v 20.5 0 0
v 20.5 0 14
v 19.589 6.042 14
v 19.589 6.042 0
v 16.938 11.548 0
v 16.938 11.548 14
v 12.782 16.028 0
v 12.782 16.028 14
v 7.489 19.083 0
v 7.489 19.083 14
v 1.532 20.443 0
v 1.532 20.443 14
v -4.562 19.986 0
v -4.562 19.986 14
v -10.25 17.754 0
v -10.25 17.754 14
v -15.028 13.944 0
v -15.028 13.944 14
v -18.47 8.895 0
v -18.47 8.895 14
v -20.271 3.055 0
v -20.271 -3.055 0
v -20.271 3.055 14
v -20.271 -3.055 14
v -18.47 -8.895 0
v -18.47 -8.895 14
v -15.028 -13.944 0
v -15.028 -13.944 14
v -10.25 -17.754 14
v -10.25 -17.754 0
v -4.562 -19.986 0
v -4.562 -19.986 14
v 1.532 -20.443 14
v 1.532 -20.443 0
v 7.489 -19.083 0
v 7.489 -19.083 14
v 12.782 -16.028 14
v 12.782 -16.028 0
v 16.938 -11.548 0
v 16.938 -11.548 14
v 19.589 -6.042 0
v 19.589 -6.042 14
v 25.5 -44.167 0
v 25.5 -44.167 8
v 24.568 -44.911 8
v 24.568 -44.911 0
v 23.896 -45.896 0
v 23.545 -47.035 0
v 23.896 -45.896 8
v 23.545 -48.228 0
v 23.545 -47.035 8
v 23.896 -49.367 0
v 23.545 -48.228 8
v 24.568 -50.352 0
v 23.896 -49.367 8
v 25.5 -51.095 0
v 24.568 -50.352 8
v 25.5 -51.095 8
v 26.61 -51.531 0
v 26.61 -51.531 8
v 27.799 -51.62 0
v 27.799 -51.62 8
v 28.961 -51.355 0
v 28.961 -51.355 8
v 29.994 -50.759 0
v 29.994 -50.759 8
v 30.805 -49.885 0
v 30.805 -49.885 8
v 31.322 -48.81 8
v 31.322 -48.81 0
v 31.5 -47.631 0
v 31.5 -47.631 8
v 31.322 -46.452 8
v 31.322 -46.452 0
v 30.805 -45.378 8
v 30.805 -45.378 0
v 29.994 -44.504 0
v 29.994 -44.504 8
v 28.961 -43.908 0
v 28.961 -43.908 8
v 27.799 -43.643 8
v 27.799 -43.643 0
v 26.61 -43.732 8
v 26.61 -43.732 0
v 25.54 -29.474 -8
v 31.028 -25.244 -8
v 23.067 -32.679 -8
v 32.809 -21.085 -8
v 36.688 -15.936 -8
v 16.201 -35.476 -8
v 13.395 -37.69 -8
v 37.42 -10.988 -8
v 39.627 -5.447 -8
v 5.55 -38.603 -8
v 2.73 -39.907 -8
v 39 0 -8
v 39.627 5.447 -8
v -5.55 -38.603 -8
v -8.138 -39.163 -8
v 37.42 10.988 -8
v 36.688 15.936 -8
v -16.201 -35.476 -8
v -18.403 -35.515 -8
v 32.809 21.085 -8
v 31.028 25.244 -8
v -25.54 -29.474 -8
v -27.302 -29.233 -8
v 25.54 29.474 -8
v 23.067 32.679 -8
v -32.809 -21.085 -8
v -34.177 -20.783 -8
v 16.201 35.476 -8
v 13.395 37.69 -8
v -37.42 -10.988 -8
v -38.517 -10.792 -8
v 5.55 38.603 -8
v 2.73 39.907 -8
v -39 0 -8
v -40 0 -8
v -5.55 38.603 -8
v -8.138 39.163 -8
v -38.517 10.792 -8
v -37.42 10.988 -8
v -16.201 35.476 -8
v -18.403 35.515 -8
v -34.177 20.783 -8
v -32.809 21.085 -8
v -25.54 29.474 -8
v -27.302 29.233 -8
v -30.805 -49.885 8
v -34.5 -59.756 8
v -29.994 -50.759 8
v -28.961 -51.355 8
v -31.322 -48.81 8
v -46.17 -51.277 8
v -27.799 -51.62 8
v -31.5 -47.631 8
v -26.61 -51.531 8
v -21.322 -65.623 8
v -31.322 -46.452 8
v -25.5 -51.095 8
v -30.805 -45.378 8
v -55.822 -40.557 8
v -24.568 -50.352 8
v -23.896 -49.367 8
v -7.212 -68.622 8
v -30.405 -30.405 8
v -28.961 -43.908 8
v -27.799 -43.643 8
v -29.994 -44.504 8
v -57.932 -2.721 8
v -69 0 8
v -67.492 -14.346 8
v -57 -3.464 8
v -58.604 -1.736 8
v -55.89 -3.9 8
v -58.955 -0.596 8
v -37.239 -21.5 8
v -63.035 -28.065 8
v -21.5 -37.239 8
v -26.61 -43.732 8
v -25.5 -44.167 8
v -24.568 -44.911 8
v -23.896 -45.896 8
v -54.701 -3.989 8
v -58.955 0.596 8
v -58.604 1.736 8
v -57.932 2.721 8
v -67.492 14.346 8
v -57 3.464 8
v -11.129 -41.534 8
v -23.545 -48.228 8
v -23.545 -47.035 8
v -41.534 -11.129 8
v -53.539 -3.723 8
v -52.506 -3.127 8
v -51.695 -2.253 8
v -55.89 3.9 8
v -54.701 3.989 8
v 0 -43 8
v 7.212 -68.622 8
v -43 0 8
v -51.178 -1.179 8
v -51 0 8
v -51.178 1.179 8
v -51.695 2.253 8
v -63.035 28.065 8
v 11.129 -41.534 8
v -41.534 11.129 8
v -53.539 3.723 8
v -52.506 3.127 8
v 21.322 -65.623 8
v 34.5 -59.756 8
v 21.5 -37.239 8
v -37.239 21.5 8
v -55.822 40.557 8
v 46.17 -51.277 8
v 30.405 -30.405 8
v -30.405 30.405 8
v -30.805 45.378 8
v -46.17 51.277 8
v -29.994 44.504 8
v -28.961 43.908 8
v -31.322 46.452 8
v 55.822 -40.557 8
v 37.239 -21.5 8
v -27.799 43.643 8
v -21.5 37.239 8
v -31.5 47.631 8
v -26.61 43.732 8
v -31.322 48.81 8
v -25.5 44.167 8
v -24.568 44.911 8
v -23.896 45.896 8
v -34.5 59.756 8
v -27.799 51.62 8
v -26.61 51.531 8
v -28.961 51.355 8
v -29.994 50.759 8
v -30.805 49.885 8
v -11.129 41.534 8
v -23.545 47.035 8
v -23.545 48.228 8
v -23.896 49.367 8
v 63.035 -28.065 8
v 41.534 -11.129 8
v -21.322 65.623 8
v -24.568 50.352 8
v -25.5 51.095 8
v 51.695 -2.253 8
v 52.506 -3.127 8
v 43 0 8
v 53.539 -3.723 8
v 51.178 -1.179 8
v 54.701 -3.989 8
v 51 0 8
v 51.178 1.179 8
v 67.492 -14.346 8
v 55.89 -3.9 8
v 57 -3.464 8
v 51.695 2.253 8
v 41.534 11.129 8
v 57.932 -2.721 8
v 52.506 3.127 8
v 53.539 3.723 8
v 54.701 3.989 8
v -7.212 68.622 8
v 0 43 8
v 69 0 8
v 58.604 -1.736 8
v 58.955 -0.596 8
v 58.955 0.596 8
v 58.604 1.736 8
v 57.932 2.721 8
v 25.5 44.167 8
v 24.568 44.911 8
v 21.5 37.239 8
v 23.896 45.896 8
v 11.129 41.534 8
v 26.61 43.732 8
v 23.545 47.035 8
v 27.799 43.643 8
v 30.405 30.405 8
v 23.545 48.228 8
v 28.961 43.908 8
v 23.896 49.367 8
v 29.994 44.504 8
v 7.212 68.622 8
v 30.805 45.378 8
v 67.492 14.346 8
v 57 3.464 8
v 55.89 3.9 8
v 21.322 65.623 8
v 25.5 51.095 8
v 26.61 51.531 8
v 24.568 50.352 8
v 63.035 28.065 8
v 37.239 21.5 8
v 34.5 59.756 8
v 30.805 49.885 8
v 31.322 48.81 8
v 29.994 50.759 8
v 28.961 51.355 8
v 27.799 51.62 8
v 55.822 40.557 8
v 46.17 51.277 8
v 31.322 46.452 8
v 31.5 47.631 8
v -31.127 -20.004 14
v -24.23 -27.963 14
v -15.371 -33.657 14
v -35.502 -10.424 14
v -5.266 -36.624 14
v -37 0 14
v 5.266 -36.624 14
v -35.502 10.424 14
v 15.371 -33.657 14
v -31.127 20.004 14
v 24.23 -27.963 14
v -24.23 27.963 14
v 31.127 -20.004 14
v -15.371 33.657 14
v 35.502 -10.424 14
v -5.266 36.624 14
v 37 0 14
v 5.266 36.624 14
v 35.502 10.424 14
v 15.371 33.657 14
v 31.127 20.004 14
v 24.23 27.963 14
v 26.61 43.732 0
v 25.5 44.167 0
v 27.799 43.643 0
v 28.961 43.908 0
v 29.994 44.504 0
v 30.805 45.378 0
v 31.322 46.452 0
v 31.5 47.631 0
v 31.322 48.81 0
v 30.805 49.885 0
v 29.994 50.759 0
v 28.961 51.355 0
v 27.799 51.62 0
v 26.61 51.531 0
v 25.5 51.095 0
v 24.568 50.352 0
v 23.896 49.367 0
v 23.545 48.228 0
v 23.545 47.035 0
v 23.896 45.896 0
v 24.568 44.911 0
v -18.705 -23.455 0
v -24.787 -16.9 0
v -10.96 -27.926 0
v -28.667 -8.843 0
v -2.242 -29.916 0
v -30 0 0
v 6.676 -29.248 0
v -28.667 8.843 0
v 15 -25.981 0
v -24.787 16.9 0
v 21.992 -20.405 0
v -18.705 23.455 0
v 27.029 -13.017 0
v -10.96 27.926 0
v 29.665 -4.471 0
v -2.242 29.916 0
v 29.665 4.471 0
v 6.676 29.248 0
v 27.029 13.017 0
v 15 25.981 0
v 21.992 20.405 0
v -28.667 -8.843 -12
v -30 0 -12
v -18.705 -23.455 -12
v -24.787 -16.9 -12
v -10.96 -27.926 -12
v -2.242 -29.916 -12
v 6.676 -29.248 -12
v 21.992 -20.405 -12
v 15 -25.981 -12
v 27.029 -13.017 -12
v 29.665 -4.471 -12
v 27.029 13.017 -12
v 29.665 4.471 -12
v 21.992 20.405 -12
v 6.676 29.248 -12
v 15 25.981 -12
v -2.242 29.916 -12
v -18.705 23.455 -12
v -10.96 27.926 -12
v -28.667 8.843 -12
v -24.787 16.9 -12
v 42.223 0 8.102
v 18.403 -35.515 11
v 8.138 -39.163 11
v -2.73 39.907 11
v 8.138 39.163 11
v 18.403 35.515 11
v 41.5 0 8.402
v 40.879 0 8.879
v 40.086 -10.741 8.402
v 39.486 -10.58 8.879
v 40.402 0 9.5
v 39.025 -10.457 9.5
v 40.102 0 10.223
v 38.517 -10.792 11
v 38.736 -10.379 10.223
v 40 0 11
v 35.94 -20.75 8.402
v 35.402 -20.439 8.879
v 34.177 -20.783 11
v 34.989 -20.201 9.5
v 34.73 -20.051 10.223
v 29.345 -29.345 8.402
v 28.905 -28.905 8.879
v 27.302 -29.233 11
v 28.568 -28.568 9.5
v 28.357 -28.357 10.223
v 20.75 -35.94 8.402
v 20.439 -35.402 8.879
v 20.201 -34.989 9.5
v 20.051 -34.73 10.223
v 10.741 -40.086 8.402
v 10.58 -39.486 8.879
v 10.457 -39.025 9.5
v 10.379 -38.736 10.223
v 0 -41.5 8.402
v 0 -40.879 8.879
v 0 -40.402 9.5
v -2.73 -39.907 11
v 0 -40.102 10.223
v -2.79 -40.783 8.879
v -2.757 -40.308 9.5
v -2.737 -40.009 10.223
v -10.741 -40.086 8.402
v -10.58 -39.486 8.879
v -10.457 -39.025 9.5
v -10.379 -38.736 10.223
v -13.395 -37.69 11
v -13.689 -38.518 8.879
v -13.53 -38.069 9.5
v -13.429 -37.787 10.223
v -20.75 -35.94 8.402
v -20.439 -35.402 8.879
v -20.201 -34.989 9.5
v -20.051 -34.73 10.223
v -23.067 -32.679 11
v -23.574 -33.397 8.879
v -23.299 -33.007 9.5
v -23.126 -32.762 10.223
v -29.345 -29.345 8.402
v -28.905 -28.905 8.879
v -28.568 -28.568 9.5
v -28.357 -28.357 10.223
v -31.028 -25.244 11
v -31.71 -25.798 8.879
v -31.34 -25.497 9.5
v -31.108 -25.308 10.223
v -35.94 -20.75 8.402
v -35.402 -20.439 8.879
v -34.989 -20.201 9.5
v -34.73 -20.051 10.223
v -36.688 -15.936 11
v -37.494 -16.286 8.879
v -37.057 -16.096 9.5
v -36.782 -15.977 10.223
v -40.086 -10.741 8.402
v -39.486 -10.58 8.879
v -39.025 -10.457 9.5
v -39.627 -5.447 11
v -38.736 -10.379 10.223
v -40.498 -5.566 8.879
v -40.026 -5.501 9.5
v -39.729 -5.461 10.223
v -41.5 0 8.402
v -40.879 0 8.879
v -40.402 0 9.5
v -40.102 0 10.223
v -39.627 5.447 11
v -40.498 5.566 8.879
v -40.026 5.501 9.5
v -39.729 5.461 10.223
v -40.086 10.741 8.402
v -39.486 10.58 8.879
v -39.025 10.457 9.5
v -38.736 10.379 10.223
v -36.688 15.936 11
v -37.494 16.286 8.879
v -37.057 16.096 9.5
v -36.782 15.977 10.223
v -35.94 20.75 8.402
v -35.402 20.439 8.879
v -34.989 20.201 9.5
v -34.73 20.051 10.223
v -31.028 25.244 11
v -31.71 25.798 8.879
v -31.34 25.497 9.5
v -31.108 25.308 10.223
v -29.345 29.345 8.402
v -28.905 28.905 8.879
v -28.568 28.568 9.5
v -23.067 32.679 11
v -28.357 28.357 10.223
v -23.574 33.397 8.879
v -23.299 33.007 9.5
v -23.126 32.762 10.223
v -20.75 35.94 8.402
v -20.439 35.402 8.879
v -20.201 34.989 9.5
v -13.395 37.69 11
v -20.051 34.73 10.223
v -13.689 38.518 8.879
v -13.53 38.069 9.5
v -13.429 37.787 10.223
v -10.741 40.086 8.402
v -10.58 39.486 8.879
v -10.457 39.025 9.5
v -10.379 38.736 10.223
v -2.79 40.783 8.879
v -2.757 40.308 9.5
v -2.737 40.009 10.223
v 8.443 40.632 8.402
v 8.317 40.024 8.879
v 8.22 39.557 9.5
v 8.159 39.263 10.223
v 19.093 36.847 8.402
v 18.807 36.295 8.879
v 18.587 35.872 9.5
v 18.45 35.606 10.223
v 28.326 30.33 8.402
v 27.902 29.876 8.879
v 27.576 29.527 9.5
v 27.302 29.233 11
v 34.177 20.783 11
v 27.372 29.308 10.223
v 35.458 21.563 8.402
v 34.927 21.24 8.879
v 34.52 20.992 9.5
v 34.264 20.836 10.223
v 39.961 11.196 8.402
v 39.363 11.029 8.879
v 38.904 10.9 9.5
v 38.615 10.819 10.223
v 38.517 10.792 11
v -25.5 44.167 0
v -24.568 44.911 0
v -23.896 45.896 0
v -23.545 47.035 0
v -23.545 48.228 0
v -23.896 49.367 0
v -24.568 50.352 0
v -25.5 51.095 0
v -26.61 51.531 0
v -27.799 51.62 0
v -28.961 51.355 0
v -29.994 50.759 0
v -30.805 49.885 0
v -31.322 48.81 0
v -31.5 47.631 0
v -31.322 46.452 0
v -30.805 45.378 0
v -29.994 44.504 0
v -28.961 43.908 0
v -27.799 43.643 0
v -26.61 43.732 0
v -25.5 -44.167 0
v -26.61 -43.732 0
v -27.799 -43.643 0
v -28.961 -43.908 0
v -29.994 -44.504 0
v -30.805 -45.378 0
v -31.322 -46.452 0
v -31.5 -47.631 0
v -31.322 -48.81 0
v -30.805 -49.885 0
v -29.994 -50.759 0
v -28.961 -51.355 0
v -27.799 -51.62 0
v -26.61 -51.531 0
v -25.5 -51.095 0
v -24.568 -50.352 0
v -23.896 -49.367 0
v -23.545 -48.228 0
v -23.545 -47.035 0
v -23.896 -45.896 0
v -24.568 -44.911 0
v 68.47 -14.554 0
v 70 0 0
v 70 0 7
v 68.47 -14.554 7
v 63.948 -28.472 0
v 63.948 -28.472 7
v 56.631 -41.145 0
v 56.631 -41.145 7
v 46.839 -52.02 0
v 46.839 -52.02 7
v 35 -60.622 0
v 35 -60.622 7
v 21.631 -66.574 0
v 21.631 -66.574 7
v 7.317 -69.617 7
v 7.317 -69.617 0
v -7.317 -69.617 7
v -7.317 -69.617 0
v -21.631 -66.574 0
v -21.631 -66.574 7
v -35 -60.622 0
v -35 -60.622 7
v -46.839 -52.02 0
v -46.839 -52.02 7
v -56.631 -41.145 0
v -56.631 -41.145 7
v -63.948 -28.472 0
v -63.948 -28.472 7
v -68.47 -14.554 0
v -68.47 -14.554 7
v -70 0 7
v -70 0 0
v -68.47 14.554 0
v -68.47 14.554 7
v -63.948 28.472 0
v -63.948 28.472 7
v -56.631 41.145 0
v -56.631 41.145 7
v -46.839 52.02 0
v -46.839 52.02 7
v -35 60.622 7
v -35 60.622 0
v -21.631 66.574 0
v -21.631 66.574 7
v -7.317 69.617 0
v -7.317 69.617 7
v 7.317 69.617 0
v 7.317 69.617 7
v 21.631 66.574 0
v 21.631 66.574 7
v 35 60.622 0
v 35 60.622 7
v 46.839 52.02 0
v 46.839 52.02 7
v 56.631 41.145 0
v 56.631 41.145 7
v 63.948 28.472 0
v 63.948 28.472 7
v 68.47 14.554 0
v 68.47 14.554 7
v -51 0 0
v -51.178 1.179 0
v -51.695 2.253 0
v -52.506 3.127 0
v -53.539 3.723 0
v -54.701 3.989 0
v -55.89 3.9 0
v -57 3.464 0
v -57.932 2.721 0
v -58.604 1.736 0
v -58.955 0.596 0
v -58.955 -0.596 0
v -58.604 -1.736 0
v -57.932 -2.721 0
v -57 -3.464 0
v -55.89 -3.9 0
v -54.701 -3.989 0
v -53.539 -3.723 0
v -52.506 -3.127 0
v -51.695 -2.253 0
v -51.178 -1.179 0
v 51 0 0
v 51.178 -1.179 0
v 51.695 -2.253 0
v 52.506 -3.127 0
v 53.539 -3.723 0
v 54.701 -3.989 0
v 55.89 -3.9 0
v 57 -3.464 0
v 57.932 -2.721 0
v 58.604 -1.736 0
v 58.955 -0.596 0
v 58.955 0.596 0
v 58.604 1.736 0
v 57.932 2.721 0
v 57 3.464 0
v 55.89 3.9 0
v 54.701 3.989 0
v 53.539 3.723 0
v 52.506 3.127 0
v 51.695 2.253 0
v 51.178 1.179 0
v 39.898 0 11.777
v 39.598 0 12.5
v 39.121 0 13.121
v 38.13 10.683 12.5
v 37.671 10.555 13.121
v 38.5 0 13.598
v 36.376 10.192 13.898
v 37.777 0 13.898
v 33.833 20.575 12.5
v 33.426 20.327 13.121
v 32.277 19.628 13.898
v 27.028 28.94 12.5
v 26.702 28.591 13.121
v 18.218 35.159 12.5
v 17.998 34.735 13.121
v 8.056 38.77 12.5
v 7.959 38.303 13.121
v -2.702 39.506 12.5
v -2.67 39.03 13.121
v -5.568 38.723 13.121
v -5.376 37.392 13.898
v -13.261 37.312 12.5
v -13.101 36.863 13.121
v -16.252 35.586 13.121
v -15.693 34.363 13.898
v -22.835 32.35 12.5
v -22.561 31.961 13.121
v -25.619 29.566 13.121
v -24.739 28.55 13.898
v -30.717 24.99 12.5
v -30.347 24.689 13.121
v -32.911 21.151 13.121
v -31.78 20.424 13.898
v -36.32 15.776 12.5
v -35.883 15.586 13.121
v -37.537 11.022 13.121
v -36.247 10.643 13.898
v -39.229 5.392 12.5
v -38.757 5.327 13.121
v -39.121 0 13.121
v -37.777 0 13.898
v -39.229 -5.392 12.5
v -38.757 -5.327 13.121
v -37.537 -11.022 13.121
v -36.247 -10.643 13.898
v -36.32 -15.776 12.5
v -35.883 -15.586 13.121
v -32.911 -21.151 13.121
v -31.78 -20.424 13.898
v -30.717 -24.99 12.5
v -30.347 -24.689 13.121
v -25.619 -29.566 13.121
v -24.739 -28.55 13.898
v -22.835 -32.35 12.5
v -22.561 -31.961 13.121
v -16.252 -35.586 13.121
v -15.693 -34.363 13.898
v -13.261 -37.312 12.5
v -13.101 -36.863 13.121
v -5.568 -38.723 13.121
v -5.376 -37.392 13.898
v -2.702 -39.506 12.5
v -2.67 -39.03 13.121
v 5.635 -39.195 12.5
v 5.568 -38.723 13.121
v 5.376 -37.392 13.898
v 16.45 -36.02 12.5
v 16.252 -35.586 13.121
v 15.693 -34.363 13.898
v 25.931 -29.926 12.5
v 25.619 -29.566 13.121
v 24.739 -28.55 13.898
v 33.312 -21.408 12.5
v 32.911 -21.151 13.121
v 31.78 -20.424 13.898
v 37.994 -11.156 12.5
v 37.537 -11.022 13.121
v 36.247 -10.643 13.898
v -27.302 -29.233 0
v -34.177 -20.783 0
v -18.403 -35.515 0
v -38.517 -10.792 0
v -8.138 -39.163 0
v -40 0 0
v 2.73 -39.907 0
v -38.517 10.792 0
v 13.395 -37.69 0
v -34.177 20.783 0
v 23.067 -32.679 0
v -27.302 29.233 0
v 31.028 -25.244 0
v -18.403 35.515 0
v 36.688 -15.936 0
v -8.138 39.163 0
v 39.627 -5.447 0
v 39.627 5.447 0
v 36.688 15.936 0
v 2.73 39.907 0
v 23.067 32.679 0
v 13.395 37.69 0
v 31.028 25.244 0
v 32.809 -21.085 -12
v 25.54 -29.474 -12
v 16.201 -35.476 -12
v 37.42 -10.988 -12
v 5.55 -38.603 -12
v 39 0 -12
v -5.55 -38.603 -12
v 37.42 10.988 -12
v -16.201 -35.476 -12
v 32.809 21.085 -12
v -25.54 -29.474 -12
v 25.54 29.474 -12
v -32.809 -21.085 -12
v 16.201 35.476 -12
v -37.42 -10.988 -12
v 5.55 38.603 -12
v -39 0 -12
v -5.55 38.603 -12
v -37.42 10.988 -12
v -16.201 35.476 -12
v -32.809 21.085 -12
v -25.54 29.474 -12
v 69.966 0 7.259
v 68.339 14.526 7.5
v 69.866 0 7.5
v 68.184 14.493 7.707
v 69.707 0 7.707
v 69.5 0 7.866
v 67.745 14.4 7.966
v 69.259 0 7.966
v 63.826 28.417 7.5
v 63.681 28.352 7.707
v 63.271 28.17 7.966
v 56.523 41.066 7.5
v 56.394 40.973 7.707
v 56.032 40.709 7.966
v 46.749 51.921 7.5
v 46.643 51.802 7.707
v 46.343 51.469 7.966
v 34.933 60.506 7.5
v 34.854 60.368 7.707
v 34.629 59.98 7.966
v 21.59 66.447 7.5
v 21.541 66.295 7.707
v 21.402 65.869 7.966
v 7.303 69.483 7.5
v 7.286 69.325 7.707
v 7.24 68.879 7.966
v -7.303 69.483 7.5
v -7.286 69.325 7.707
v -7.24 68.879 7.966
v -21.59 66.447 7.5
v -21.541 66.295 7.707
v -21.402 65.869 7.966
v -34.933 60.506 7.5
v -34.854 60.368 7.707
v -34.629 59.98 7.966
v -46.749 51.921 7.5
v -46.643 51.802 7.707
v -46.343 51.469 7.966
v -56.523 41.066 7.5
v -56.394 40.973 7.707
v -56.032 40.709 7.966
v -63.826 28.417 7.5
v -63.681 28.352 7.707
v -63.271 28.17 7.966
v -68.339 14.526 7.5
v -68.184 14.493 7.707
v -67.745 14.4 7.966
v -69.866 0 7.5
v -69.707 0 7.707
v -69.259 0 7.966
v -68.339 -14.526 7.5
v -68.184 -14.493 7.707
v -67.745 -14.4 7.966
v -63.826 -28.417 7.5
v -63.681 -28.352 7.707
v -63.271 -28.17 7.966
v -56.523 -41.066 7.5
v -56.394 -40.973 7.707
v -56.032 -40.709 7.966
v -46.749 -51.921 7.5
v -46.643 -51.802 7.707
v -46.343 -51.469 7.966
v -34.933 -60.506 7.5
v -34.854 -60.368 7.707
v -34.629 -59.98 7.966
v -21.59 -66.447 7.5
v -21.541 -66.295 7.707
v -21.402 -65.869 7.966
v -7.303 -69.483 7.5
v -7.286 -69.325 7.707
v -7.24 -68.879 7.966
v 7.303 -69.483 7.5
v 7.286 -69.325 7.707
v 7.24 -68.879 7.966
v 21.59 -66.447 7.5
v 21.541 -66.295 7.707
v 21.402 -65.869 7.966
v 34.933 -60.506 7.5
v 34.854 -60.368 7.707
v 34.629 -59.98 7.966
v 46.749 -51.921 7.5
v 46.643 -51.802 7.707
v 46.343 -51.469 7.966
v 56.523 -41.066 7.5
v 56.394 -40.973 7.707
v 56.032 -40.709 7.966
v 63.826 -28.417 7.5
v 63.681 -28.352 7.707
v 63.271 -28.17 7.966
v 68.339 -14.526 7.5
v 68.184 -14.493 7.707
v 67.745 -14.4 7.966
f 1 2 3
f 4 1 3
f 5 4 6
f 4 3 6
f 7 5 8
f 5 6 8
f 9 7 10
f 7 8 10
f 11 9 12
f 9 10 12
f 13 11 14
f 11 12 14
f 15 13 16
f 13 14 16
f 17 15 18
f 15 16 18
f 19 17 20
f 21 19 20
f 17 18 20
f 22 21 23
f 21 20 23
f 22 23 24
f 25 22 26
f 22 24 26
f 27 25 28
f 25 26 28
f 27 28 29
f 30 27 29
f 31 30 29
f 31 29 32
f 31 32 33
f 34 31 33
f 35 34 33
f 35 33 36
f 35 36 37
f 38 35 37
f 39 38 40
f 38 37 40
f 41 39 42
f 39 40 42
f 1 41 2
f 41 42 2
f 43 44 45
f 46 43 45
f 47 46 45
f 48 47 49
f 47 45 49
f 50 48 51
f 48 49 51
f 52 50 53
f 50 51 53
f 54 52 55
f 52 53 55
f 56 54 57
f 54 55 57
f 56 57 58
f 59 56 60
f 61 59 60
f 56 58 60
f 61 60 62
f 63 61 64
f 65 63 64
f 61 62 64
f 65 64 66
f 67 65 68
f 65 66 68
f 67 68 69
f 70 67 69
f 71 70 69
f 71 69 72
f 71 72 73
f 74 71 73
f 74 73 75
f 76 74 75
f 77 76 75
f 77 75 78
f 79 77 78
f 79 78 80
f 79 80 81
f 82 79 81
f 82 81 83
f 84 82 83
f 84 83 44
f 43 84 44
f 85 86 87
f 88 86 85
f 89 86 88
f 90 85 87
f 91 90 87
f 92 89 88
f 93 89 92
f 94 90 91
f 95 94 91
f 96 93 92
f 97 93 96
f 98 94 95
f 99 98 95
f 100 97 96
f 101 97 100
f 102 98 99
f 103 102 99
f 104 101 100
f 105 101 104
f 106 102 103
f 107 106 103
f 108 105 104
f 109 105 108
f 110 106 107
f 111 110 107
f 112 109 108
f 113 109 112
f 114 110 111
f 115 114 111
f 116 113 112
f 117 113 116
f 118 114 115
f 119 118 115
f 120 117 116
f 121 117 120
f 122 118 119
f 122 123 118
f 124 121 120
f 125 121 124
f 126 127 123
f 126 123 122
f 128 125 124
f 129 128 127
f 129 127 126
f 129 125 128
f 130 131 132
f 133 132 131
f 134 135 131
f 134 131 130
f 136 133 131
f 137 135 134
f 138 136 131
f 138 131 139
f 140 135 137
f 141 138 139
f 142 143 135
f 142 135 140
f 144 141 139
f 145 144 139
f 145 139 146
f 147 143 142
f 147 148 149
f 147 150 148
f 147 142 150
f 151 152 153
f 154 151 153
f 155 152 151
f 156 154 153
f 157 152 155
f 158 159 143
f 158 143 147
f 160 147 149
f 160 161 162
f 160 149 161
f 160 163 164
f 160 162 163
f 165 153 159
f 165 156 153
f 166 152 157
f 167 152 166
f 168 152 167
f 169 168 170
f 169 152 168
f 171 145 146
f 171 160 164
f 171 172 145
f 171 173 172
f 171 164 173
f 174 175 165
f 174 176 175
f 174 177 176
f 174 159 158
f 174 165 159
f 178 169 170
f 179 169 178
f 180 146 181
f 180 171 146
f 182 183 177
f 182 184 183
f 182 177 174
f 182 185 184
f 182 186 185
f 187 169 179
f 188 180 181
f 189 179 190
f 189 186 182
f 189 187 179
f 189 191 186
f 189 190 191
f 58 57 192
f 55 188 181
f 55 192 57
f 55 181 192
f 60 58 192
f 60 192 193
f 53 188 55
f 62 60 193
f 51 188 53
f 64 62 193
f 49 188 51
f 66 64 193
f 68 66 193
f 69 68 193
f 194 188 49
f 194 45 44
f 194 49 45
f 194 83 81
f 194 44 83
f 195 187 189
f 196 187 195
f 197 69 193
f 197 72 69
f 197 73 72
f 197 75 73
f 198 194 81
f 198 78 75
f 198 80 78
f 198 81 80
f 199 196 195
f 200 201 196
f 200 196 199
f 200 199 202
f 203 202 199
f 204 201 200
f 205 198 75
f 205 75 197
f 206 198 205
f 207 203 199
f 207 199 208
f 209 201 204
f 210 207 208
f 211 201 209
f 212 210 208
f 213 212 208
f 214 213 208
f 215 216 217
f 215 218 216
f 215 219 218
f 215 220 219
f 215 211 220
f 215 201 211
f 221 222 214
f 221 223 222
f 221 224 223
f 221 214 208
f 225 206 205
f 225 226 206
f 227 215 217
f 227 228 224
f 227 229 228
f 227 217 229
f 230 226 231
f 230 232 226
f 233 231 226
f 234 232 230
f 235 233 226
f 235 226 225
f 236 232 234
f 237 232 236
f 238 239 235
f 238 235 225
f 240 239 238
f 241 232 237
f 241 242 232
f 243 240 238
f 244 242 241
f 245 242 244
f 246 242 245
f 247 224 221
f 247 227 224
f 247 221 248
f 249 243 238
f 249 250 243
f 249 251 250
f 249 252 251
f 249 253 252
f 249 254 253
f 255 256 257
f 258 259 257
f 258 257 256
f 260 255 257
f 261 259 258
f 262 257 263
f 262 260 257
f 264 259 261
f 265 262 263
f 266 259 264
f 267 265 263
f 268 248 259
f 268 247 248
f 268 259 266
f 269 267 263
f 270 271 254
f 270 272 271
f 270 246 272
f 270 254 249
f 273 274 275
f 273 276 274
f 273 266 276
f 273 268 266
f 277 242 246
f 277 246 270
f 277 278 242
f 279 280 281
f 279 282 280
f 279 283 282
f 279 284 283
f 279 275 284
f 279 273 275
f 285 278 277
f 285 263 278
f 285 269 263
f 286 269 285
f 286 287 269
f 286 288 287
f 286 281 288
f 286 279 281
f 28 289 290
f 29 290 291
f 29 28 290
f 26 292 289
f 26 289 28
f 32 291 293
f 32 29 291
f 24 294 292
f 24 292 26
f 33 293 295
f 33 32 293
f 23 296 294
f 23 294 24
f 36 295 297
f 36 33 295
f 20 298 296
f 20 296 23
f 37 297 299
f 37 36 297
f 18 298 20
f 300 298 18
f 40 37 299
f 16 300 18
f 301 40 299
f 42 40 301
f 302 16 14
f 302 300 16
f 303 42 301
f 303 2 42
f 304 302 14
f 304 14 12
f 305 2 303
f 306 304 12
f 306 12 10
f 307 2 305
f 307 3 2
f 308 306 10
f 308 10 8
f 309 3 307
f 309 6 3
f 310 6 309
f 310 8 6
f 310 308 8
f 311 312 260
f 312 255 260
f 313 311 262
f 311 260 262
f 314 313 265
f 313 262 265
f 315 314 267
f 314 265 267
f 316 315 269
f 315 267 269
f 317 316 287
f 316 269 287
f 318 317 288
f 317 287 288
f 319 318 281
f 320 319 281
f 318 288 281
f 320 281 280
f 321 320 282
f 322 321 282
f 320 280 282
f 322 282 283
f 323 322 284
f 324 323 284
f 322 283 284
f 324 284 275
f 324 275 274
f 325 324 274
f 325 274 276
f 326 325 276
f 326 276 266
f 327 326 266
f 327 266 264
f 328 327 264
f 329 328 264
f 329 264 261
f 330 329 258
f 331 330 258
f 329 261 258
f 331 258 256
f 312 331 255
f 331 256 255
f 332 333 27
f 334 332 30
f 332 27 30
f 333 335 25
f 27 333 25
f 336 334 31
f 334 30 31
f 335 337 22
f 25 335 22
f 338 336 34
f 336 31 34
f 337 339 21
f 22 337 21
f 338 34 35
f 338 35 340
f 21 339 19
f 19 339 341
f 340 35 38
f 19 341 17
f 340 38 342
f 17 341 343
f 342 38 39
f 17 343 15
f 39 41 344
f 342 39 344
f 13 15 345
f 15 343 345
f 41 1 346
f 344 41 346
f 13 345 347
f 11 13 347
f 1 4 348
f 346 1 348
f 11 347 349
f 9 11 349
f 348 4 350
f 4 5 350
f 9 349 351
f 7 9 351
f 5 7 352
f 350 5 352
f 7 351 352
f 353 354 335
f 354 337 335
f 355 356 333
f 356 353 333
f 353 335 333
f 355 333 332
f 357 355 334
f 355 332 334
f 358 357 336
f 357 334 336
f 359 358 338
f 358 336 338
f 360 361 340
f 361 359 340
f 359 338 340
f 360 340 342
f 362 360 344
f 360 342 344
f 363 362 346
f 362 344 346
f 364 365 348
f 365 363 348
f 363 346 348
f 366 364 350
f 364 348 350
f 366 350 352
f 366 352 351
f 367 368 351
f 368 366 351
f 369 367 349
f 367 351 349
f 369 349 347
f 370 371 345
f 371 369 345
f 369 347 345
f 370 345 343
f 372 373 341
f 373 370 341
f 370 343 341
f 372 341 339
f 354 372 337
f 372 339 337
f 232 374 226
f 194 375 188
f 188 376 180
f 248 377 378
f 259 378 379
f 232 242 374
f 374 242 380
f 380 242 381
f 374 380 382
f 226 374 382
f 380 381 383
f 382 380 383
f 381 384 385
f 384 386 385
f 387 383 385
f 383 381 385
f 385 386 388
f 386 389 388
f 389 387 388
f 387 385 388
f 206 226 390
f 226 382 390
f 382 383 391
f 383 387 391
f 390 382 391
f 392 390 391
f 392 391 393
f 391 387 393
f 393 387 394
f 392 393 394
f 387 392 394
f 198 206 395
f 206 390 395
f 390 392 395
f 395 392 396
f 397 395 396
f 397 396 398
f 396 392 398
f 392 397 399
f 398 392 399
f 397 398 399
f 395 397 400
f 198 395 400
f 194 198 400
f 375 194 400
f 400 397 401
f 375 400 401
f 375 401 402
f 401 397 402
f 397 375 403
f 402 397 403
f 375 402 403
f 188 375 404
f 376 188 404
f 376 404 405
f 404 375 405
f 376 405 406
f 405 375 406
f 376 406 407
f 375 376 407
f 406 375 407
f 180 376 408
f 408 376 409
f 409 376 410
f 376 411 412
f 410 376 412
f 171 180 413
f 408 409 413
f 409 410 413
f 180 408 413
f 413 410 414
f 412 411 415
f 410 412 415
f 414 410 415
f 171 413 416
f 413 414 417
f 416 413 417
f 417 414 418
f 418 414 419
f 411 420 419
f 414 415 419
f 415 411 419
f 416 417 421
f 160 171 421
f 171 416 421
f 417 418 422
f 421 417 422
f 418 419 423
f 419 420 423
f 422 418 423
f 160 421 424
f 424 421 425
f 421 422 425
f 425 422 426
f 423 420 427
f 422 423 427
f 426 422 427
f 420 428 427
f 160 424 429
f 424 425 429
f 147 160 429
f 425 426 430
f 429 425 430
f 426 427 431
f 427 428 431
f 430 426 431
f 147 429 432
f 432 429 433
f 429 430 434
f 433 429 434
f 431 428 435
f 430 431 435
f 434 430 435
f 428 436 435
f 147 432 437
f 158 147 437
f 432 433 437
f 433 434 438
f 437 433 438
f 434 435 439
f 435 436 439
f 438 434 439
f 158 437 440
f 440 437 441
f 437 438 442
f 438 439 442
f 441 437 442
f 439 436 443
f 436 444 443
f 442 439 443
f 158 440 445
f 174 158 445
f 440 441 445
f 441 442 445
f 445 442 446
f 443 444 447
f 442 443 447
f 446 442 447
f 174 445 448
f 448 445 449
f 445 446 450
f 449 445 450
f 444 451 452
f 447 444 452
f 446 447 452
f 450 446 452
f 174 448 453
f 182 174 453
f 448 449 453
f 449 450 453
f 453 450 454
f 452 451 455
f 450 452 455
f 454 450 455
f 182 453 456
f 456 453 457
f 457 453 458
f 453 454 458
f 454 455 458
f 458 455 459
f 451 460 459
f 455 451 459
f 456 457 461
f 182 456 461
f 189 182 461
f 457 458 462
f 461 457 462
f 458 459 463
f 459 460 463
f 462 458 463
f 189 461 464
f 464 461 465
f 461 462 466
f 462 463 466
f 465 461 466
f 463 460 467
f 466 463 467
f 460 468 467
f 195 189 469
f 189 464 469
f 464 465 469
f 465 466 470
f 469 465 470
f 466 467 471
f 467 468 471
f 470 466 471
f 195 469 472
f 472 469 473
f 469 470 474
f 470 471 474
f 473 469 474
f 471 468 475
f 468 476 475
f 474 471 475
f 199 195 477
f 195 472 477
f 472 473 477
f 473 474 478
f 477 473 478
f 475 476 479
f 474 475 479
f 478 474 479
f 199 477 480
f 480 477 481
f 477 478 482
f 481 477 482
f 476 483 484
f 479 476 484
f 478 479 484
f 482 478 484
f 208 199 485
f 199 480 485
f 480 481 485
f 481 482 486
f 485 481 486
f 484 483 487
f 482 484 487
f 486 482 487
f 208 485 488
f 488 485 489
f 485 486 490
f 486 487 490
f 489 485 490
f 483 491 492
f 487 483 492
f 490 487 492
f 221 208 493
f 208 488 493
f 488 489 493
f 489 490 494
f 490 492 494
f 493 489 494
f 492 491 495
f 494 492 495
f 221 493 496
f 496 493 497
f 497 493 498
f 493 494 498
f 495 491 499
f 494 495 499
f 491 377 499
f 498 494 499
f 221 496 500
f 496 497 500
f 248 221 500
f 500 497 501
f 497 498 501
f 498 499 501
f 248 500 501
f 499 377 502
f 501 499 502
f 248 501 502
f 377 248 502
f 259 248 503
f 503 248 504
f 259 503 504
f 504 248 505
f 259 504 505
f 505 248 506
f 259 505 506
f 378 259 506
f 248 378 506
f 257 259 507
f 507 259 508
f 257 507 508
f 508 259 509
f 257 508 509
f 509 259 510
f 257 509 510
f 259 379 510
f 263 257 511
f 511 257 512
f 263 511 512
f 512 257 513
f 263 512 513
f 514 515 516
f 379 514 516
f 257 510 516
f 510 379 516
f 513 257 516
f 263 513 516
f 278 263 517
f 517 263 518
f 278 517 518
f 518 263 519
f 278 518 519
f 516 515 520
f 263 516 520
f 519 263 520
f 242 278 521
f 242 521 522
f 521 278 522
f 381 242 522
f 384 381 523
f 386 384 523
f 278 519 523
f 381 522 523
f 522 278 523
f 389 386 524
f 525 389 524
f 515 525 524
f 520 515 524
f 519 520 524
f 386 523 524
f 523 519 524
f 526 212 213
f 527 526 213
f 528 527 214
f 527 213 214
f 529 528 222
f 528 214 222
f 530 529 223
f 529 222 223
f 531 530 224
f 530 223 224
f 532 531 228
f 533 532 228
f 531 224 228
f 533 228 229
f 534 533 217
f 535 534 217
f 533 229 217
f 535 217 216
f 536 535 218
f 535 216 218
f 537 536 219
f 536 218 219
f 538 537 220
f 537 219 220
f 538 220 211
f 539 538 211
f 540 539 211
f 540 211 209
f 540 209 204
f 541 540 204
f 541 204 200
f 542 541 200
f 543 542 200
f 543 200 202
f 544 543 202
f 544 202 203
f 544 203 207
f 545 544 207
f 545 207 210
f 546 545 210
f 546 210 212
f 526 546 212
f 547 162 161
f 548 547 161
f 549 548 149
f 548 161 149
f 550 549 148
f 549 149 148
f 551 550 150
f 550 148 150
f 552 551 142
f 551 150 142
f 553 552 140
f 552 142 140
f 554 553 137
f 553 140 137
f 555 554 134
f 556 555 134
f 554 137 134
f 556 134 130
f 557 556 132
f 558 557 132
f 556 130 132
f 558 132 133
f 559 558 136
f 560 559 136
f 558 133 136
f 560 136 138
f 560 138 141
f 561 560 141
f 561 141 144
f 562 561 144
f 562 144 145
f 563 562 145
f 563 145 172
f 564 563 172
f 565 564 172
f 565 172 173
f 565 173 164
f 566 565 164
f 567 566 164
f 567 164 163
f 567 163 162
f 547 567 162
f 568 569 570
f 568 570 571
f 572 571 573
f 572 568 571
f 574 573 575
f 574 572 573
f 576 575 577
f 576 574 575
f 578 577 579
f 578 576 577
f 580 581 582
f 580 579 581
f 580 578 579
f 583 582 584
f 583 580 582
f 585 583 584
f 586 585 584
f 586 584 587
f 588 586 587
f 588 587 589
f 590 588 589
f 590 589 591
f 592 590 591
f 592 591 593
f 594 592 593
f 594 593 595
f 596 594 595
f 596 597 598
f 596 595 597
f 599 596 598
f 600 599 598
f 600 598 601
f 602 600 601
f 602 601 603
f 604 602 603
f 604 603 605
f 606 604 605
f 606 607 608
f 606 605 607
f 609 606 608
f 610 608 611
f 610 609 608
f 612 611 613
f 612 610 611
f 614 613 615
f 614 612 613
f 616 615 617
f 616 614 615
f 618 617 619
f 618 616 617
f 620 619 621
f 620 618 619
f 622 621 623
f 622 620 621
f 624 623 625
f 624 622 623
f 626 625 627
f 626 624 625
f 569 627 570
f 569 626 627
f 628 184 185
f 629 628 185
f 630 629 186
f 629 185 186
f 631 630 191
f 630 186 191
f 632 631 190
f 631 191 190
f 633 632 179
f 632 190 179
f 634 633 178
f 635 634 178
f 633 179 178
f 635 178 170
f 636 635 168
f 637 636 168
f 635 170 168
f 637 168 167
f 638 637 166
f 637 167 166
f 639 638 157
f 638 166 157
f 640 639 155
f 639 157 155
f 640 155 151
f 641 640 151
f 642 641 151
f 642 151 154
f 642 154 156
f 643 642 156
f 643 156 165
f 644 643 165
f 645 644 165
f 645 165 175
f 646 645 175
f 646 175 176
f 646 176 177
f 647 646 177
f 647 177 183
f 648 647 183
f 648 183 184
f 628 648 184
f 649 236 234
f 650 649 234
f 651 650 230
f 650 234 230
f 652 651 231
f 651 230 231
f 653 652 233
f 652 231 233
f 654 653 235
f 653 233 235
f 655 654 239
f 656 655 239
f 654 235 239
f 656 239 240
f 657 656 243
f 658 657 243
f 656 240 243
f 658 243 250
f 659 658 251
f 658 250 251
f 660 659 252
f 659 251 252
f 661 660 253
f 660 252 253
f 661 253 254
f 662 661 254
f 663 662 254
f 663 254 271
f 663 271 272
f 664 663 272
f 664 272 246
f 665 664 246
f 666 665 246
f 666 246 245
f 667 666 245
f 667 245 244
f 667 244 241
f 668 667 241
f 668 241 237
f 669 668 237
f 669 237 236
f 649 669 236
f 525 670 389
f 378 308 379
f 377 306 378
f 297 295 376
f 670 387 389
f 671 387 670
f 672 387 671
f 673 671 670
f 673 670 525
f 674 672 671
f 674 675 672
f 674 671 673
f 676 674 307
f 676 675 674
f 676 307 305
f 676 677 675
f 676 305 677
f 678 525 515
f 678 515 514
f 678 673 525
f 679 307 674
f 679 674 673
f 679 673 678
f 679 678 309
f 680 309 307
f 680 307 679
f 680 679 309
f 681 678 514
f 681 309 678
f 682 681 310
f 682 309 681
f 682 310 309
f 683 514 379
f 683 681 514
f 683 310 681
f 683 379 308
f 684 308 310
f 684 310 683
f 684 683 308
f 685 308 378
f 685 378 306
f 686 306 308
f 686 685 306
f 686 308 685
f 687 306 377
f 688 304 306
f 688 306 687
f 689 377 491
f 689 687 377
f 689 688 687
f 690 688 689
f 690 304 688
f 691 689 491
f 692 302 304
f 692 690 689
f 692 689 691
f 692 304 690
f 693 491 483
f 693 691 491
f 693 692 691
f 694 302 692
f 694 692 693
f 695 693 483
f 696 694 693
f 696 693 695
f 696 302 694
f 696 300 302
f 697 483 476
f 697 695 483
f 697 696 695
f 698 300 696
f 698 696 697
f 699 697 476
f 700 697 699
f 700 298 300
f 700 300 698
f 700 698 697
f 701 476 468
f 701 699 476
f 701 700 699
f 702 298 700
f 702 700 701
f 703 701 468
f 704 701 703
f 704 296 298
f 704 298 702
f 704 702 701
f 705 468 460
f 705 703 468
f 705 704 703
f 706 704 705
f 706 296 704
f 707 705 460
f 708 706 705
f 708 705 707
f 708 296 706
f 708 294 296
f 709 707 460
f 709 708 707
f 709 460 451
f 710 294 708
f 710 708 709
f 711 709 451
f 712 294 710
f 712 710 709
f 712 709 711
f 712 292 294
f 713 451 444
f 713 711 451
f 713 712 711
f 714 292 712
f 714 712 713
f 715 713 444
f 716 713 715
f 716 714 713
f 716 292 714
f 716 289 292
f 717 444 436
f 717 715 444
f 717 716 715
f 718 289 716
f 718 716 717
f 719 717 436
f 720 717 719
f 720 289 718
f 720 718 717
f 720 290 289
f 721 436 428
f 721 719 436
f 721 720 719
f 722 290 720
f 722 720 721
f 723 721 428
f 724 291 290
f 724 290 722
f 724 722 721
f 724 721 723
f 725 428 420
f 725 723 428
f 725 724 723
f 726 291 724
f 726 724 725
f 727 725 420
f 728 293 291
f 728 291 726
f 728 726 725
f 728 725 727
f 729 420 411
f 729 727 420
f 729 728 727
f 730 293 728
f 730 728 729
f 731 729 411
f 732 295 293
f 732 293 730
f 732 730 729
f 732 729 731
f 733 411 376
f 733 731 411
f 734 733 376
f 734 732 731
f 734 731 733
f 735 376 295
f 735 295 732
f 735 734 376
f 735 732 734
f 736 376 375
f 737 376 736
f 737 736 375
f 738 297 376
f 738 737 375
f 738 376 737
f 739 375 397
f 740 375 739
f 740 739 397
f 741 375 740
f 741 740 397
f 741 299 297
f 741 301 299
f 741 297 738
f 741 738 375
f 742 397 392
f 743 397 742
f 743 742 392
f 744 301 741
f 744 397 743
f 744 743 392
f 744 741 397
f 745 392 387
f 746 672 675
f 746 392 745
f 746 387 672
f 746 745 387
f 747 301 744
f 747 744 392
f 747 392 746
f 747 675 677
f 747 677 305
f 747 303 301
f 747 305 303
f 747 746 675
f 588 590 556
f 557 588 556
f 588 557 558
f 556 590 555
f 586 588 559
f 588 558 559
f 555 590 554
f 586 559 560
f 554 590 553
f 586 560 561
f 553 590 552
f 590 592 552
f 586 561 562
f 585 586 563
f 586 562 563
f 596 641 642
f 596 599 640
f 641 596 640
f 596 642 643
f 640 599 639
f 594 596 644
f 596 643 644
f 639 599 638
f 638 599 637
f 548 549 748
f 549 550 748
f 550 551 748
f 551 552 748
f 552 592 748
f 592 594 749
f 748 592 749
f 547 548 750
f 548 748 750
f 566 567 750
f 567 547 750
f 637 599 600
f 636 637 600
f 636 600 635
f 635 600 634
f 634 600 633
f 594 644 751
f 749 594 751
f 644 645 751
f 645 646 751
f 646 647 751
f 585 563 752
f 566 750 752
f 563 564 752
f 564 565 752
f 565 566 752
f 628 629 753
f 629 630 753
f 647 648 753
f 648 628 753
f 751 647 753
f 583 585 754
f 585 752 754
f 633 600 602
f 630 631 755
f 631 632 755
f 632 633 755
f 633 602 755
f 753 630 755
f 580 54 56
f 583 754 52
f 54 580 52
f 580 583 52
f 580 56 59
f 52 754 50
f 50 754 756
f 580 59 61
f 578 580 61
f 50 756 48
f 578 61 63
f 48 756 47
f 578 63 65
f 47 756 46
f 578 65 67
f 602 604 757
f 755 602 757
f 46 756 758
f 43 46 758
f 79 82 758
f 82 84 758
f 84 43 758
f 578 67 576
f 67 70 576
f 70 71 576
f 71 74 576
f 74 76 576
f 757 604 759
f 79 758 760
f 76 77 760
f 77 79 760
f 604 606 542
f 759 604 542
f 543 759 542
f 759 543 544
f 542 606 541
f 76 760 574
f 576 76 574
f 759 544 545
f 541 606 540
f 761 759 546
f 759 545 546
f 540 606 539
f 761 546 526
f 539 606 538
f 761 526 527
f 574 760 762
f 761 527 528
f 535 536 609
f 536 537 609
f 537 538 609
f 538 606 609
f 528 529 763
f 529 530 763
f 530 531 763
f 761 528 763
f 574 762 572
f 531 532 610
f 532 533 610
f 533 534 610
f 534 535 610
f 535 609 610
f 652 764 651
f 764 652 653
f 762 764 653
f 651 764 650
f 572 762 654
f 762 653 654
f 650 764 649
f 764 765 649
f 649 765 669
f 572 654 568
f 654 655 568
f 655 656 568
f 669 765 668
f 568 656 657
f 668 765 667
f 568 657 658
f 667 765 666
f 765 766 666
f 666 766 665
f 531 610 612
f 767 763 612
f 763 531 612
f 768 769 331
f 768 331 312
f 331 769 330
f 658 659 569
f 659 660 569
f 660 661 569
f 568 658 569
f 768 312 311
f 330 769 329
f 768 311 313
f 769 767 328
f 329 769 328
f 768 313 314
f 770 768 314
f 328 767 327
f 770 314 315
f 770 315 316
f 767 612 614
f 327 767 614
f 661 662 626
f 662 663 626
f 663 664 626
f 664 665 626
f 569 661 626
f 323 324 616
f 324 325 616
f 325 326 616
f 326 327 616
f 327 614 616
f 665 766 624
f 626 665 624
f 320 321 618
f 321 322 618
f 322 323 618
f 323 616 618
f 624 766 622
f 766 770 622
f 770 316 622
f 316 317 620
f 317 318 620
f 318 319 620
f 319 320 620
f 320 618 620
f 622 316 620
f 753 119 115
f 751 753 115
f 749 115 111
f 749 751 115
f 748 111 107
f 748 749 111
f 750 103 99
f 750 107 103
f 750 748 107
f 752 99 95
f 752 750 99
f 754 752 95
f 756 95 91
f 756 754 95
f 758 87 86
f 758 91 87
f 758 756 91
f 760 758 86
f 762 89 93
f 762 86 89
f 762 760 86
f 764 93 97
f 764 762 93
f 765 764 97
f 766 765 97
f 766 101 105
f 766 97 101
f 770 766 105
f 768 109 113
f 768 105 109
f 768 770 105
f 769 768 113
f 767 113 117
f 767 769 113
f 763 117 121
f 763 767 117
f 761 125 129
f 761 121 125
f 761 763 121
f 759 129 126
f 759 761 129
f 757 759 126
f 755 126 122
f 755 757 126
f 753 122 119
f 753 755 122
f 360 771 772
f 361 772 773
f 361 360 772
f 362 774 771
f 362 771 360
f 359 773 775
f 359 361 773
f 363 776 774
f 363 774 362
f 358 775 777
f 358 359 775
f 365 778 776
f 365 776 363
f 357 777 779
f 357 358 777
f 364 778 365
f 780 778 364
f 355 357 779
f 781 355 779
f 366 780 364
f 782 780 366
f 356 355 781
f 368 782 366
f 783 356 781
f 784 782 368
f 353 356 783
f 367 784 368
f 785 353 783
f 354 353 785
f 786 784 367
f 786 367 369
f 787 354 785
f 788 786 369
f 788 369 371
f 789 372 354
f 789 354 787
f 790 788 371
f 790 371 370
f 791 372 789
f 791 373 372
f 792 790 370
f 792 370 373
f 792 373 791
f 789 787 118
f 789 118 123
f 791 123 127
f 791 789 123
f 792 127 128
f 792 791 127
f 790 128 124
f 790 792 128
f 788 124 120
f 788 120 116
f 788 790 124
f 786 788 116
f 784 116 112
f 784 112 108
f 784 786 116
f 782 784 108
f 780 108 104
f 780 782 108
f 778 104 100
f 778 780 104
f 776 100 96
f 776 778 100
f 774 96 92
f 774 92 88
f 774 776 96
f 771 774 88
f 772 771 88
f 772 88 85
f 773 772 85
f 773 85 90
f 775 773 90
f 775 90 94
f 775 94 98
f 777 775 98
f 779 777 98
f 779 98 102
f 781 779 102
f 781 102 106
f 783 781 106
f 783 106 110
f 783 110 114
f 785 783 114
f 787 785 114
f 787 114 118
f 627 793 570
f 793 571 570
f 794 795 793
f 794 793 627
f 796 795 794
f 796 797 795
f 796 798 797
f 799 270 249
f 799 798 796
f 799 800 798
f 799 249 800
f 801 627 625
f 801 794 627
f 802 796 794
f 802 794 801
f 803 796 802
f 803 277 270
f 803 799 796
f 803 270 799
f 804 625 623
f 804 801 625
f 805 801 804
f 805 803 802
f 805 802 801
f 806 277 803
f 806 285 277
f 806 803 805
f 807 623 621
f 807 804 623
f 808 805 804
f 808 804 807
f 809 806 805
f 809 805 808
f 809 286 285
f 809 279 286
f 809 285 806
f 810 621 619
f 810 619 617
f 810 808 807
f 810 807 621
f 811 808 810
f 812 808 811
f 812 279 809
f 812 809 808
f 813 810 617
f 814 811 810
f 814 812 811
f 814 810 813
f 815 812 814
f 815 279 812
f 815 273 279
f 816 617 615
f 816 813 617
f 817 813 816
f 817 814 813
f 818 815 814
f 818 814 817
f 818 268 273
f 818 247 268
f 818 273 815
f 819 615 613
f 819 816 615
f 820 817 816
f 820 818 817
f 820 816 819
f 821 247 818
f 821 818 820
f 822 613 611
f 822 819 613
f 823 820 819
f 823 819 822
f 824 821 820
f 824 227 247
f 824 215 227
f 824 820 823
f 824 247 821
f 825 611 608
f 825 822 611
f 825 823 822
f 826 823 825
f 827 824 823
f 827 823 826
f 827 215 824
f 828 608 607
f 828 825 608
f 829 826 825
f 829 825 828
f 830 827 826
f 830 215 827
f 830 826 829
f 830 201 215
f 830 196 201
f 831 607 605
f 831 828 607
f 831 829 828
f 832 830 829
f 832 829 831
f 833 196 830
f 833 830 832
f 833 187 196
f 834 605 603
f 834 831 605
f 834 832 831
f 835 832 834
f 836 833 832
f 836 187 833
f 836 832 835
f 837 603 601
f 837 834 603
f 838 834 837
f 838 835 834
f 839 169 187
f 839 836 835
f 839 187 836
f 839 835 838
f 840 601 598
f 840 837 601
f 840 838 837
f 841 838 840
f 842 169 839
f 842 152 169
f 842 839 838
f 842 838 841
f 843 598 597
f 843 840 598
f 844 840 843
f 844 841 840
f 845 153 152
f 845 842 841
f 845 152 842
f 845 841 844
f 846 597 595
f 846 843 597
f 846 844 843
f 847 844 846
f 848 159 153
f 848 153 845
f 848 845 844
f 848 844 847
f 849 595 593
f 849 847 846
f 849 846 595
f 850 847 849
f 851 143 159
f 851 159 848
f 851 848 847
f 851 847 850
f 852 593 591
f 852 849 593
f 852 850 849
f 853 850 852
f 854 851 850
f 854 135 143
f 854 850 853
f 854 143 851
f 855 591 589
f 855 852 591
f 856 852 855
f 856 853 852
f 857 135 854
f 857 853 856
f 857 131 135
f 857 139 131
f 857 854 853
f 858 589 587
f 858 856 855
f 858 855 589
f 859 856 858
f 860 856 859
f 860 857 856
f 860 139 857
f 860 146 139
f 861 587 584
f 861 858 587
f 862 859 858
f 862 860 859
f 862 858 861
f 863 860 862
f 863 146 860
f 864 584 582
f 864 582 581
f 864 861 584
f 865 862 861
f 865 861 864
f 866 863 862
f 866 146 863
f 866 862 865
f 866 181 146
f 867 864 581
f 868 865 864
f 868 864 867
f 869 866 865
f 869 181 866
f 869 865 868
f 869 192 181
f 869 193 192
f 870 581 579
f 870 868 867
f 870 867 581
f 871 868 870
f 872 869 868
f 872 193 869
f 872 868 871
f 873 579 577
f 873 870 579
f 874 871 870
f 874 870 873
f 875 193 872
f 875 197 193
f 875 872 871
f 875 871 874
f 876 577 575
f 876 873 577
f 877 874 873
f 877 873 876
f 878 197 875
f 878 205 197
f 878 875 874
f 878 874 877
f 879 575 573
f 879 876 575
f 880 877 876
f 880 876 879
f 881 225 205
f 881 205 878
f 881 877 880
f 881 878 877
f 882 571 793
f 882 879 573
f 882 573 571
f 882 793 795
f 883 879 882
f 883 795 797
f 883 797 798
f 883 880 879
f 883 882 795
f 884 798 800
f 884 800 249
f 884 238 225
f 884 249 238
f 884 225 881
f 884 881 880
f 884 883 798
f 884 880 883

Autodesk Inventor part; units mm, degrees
ref_plane "YZ Plane" through (0, 0, 0) normal (1, 0, 0) x (0, 1, 0)
ref_plane "XZ Plane" through (0, 0, 0) normal (0, 1, 0) x (-1, 0, 0)
ref_plane "XY Plane" through (0, 0, 0) normal (0, 0, 1) x (1, 0, 0)
sketch "草图1" plane through (0, 0, 0) normal (0, 0, 1) x (1, 0, 0)
  circle A0 centre (0, 0) radius 70
  dimension "d0" = 140
extrude "拉伸1" add sketch "草图1" along normal blind 8
sketch "草图2" plane through (0, 0, 0) normal (0, 0, -1) x (-1, 0, 0)
  circle A0 centre (0, 0) radius 40
  circle A1 centre (0, 0) radius 30
  dimension "d3" = 80
  dimension "d4" = 60
extrude "拉伸2" add sketch "草图2" along normal blind 12
sketch "草图3" plane through (0, 0, -12) normal (0, 0, -1) x (-1, 0, 0)
  circle A0 centre (0, 0) radius 40
  circle A1 centre (0, 0) radius 39
  dimension "d7" = 80
  dimension "d8" = 78
extrude "拉伸3" cut sketch "草图3" against normal blind 4
fillet "圆角2" radius 1 1 edges at (-70, 0, 8)
sketch "草图5" plane through (0, 0, 8) normal (0, 0, 1) x (1, 0, 0)
  circle A0 centre (-55, 0) radius 4
  line L0 (0, 0) -> (-8.161, 0)
  dimension "d16" = 8
  dimension "d17" = 8.161
  dimension "d18" = 55
extrude "拉伸5" cut sketch "草图5" against normal through all
pattern_circular "环形阵列1" count 6 over 360 about axis through (0, 0, -10) along (0, 0, 1) of "拉伸5"
sketch "草图6" plane through (0, 0, 8) normal (0, 0, 1) x (1, 0, 0)
  circle A0 centre (0, 0) radius 40
  dimension "d24" = 80
extrude "拉伸6" add sketch "草图6" along normal blind 6
sketch "草图7" plane through (0, 0, 14) normal (0, 0, 1) x (1, 0, 0)
  circle A0 centre (0, 0) radius 20.5
  dimension "d27" = 41
extrude "拉伸7" cut sketch "草图7" against normal through all
fillet "圆角3" radius 3 2 edges at (-40, 0, 14) (-40, 0, 8)
properties part number "主动轴大端盖"
